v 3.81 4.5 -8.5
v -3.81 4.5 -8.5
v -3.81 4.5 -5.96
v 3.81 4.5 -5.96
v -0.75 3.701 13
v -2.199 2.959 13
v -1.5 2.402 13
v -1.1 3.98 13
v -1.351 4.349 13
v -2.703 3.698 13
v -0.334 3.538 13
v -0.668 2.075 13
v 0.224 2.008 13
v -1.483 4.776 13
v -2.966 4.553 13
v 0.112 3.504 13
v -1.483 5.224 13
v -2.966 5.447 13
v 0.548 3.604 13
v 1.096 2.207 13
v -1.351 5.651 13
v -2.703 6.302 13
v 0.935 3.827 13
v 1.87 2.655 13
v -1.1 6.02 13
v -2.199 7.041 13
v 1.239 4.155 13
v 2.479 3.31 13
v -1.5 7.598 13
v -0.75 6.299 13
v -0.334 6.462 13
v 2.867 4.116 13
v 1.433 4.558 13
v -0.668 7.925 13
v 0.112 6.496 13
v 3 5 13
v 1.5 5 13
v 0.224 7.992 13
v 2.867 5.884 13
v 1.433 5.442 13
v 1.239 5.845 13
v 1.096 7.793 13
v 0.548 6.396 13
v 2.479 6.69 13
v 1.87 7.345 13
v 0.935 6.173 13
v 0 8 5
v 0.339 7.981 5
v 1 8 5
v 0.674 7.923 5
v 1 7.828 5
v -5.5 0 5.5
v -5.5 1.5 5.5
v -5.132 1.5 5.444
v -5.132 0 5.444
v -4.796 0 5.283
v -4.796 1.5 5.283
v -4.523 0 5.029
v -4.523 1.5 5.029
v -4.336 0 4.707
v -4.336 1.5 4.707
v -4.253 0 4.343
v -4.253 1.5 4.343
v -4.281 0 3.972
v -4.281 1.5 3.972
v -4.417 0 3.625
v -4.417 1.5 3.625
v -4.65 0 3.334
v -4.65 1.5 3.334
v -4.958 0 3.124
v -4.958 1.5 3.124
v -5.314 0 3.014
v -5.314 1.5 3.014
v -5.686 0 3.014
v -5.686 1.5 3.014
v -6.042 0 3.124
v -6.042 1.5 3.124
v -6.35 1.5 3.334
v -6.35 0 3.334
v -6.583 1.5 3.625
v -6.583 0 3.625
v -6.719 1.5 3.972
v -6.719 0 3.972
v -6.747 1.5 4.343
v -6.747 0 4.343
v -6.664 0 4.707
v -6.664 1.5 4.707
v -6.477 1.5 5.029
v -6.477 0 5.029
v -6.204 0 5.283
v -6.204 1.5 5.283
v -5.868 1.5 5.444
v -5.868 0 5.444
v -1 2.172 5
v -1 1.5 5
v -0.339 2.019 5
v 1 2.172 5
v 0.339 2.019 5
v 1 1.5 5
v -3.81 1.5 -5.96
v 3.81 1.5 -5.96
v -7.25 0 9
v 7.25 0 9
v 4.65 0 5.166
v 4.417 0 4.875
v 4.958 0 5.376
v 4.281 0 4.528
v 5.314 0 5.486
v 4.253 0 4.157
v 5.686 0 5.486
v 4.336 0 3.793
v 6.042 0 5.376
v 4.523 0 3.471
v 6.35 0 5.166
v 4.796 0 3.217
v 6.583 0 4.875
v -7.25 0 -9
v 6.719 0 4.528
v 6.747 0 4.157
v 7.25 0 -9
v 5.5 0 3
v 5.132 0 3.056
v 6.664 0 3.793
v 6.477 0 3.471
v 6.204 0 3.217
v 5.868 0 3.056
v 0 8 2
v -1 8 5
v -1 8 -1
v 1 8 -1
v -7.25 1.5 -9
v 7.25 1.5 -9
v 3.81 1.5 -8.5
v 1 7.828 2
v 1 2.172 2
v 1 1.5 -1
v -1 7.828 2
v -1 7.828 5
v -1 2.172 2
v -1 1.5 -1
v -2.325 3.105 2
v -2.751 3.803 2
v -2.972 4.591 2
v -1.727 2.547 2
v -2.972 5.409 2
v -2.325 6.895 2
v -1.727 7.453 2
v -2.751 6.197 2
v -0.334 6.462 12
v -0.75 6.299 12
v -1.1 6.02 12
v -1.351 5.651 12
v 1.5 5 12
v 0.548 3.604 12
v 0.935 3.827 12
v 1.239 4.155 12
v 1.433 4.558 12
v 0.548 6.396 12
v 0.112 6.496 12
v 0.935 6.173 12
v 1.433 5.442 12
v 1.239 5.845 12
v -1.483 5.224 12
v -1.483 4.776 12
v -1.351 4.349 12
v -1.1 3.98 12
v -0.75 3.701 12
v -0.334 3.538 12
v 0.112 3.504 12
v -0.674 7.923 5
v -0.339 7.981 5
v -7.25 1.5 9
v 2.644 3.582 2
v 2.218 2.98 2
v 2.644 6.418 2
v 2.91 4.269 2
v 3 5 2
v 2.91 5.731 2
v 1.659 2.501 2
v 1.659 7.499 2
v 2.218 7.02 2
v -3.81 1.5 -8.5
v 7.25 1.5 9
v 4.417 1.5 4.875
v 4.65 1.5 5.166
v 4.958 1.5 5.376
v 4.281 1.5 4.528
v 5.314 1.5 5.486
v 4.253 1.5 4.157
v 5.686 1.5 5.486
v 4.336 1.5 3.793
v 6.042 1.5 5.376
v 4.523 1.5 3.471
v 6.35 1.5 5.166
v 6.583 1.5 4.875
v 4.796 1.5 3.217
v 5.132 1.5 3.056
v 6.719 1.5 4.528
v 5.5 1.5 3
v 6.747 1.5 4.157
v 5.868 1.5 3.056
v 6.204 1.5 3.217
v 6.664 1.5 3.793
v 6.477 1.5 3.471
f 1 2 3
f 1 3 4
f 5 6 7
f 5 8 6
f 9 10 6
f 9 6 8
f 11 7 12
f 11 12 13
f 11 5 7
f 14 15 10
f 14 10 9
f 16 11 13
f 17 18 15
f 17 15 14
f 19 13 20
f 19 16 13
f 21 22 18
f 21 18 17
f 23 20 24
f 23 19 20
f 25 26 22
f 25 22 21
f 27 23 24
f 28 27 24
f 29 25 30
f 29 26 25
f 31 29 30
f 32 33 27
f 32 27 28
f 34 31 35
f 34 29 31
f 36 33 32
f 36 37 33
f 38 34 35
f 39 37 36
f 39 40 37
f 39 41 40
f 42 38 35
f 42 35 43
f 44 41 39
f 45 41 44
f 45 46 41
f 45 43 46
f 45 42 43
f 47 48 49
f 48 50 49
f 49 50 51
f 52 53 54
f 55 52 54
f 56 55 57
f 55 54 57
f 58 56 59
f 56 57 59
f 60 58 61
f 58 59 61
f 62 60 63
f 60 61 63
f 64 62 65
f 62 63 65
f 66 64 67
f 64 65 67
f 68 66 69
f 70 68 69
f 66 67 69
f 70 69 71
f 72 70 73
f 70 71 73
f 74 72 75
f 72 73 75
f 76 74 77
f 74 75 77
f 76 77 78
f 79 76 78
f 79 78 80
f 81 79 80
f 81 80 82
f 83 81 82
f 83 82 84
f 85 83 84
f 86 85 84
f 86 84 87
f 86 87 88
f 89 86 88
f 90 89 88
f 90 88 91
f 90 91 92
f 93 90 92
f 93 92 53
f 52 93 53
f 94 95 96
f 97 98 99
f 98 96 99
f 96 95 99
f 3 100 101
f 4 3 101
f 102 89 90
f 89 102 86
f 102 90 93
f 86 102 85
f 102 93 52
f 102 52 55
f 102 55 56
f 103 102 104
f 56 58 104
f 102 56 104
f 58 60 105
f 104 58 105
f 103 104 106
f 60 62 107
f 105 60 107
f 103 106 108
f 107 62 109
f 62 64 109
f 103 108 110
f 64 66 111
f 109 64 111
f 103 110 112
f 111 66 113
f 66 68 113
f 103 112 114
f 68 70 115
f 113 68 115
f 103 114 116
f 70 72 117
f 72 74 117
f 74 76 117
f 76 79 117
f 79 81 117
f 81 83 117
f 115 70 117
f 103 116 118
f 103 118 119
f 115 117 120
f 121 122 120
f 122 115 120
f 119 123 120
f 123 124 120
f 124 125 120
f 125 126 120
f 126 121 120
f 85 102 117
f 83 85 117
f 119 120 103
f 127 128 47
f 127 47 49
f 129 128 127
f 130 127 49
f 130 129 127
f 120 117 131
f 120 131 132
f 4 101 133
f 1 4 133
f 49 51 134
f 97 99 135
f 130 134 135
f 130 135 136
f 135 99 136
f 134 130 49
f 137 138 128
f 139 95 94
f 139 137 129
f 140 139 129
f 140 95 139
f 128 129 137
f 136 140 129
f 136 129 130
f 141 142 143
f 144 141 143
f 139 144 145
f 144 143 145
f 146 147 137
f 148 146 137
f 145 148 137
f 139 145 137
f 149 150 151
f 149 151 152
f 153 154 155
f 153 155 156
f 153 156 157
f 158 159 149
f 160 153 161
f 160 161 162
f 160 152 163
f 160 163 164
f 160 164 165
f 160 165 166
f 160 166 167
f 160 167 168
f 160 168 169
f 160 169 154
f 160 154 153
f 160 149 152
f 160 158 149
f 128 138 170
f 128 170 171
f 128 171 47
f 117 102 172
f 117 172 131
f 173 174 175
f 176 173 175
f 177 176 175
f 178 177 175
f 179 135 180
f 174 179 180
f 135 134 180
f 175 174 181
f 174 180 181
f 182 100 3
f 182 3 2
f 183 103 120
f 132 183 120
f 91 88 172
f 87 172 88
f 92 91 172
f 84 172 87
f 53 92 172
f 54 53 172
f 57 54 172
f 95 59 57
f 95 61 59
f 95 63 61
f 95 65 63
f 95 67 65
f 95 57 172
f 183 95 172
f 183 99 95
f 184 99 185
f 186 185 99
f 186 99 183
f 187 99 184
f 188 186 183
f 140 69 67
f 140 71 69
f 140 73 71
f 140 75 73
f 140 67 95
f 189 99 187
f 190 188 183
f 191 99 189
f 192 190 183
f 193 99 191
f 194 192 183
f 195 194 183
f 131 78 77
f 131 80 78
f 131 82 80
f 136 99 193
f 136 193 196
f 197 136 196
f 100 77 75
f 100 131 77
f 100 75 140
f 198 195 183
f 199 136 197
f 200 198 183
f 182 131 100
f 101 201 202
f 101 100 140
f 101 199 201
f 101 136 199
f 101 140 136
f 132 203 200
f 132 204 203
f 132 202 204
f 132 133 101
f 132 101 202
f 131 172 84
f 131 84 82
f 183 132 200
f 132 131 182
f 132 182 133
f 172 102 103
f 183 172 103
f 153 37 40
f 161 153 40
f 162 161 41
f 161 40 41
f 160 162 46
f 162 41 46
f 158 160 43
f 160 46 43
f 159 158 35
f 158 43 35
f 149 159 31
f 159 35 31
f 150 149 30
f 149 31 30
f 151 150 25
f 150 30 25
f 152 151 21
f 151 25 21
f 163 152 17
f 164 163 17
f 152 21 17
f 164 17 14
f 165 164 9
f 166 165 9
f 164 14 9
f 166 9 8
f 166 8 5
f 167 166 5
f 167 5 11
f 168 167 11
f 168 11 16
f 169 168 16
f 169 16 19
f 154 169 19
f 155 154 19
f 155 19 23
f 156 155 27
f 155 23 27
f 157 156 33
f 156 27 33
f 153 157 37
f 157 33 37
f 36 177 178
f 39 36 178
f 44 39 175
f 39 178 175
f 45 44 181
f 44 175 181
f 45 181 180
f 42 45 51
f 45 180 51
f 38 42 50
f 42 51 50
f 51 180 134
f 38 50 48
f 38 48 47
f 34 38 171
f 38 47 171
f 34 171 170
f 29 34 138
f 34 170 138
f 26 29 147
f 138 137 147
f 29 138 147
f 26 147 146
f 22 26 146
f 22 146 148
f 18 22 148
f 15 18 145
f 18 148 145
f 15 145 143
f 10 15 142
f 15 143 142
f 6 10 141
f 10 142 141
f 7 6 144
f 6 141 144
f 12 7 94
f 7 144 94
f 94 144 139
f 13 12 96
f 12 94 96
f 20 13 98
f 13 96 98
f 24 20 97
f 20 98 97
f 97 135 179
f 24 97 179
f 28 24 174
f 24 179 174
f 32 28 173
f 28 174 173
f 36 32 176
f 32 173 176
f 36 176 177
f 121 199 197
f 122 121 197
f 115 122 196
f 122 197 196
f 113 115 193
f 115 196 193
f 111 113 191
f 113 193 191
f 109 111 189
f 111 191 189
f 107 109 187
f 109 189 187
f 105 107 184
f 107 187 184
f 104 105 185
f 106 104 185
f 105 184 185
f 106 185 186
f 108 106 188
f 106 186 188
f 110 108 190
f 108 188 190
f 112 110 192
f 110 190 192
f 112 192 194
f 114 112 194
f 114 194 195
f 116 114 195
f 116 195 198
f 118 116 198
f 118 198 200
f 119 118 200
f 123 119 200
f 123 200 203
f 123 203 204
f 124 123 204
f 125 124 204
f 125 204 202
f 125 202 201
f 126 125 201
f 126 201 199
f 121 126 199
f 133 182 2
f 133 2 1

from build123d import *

# Parameters (mm, degrees)
SKETCH1_W                = 14.5
SKETCH1_H                = 18
BOSS_EXTRUDE1_DEPTH      = 1.5
BOSS_EXTRUDE2_DEPTH      = 4
BOSS_EXTRUDE2_DEPTH_BACK = 7
SKETCH2_R                = 3
SKETCH3_R                = 1.5
CUT_EXTRUDE1_DEPTH       = 1
SKETCH4_W                = 2
SKETCH4_H                = 6
BOSS_EXTRUDE3_DEPTH      = 6.5
SKETCH5_W                = 7.62
SKETCH5_H                = 2.54
BOSS_EXTRUDE4_DEPTH      = 3
SKETCH7_R                = 1.25
CUT_EXTRUDE2_DEPTH       = 17.242305871


with BuildPart() as part:
    # Sketch1 → Boss-Extrude1 (new body)
    with BuildSketch(Plane(origin=(0, 0, 0), x_dir=(1, 0, 0), z_dir=(0, 1, 0))):
        Rectangle(SKETCH1_W, SKETCH1_H)
    extrude(amount=BOSS_EXTRUDE1_DEPTH)



with BuildPart() as body_2:
    # Sketch2 → Boss-Extrude2 (new, two sides: drawn at the far end of the back side and taken through both)
    with BuildSketch(Plane.XY.offset(9).offset(-BOSS_EXTRUDE2_DEPTH_BACK)):
        with Locations((0, 5)):
            Circle(SKETCH2_R)
    extrude(amount=BOSS_EXTRUDE2_DEPTH + BOSS_EXTRUDE2_DEPTH_BACK)

    # Sketch3 → Cut-Extrude1 (cut)
    with BuildSketch(Plane.XY.offset(13)):
        with Locations((0, 5)):
            Circle(SKETCH3_R)
    extrude(amount=-CUT_EXTRUDE1_DEPTH, mode=Mode.SUBTRACT)


with BuildPart() as part_1:
    add(part.part)

    add(body_2.part)  # Boss-Extrude3 merges body 2
    # Sketch4 → Boss-Extrude3 (add)
    with BuildSketch(Plane(origin=(0, 1.5, 0), x_dir=(1, 0, 0), z_dir=(0, 1, 0))):
        with Locations((0, -2)):
            Rectangle(SKETCH4_W, SKETCH4_H)
    extrude(amount=BOSS_EXTRUDE3_DEPTH)

    # Sketch5 → Boss-Extrude4 (add)
    with BuildSketch(Plane(origin=(0, 1.5, 0), x_dir=(1, 0, 0), z_dir=(0, 1, 0))):
        with Locations((0, 7.23)):
            Rectangle(SKETCH5_W, SKETCH5_H)
    extrude(amount=BOSS_EXTRUDE4_DEPTH)

    # Sketch7 → Cut-Extrude2 (cut, through all)
    with BuildSketch(Plane(origin=(0, 1.5, 0), x_dir=(1, 0, 0), z_dir=(0, 1, 0))):
        with Locations(Location((-5.5, -4.25, 0), (0, 0, 270))):
            Circle(SKETCH7_R)
        with Locations(Location((5.5, -4.25, 0), (0, 0, 90))):
            Circle(SKETCH7_R)
    extrude(amount=-CUT_EXTRUDE2_DEPTH, mode=Mode.SUBTRACT)


solid = part_1.part
